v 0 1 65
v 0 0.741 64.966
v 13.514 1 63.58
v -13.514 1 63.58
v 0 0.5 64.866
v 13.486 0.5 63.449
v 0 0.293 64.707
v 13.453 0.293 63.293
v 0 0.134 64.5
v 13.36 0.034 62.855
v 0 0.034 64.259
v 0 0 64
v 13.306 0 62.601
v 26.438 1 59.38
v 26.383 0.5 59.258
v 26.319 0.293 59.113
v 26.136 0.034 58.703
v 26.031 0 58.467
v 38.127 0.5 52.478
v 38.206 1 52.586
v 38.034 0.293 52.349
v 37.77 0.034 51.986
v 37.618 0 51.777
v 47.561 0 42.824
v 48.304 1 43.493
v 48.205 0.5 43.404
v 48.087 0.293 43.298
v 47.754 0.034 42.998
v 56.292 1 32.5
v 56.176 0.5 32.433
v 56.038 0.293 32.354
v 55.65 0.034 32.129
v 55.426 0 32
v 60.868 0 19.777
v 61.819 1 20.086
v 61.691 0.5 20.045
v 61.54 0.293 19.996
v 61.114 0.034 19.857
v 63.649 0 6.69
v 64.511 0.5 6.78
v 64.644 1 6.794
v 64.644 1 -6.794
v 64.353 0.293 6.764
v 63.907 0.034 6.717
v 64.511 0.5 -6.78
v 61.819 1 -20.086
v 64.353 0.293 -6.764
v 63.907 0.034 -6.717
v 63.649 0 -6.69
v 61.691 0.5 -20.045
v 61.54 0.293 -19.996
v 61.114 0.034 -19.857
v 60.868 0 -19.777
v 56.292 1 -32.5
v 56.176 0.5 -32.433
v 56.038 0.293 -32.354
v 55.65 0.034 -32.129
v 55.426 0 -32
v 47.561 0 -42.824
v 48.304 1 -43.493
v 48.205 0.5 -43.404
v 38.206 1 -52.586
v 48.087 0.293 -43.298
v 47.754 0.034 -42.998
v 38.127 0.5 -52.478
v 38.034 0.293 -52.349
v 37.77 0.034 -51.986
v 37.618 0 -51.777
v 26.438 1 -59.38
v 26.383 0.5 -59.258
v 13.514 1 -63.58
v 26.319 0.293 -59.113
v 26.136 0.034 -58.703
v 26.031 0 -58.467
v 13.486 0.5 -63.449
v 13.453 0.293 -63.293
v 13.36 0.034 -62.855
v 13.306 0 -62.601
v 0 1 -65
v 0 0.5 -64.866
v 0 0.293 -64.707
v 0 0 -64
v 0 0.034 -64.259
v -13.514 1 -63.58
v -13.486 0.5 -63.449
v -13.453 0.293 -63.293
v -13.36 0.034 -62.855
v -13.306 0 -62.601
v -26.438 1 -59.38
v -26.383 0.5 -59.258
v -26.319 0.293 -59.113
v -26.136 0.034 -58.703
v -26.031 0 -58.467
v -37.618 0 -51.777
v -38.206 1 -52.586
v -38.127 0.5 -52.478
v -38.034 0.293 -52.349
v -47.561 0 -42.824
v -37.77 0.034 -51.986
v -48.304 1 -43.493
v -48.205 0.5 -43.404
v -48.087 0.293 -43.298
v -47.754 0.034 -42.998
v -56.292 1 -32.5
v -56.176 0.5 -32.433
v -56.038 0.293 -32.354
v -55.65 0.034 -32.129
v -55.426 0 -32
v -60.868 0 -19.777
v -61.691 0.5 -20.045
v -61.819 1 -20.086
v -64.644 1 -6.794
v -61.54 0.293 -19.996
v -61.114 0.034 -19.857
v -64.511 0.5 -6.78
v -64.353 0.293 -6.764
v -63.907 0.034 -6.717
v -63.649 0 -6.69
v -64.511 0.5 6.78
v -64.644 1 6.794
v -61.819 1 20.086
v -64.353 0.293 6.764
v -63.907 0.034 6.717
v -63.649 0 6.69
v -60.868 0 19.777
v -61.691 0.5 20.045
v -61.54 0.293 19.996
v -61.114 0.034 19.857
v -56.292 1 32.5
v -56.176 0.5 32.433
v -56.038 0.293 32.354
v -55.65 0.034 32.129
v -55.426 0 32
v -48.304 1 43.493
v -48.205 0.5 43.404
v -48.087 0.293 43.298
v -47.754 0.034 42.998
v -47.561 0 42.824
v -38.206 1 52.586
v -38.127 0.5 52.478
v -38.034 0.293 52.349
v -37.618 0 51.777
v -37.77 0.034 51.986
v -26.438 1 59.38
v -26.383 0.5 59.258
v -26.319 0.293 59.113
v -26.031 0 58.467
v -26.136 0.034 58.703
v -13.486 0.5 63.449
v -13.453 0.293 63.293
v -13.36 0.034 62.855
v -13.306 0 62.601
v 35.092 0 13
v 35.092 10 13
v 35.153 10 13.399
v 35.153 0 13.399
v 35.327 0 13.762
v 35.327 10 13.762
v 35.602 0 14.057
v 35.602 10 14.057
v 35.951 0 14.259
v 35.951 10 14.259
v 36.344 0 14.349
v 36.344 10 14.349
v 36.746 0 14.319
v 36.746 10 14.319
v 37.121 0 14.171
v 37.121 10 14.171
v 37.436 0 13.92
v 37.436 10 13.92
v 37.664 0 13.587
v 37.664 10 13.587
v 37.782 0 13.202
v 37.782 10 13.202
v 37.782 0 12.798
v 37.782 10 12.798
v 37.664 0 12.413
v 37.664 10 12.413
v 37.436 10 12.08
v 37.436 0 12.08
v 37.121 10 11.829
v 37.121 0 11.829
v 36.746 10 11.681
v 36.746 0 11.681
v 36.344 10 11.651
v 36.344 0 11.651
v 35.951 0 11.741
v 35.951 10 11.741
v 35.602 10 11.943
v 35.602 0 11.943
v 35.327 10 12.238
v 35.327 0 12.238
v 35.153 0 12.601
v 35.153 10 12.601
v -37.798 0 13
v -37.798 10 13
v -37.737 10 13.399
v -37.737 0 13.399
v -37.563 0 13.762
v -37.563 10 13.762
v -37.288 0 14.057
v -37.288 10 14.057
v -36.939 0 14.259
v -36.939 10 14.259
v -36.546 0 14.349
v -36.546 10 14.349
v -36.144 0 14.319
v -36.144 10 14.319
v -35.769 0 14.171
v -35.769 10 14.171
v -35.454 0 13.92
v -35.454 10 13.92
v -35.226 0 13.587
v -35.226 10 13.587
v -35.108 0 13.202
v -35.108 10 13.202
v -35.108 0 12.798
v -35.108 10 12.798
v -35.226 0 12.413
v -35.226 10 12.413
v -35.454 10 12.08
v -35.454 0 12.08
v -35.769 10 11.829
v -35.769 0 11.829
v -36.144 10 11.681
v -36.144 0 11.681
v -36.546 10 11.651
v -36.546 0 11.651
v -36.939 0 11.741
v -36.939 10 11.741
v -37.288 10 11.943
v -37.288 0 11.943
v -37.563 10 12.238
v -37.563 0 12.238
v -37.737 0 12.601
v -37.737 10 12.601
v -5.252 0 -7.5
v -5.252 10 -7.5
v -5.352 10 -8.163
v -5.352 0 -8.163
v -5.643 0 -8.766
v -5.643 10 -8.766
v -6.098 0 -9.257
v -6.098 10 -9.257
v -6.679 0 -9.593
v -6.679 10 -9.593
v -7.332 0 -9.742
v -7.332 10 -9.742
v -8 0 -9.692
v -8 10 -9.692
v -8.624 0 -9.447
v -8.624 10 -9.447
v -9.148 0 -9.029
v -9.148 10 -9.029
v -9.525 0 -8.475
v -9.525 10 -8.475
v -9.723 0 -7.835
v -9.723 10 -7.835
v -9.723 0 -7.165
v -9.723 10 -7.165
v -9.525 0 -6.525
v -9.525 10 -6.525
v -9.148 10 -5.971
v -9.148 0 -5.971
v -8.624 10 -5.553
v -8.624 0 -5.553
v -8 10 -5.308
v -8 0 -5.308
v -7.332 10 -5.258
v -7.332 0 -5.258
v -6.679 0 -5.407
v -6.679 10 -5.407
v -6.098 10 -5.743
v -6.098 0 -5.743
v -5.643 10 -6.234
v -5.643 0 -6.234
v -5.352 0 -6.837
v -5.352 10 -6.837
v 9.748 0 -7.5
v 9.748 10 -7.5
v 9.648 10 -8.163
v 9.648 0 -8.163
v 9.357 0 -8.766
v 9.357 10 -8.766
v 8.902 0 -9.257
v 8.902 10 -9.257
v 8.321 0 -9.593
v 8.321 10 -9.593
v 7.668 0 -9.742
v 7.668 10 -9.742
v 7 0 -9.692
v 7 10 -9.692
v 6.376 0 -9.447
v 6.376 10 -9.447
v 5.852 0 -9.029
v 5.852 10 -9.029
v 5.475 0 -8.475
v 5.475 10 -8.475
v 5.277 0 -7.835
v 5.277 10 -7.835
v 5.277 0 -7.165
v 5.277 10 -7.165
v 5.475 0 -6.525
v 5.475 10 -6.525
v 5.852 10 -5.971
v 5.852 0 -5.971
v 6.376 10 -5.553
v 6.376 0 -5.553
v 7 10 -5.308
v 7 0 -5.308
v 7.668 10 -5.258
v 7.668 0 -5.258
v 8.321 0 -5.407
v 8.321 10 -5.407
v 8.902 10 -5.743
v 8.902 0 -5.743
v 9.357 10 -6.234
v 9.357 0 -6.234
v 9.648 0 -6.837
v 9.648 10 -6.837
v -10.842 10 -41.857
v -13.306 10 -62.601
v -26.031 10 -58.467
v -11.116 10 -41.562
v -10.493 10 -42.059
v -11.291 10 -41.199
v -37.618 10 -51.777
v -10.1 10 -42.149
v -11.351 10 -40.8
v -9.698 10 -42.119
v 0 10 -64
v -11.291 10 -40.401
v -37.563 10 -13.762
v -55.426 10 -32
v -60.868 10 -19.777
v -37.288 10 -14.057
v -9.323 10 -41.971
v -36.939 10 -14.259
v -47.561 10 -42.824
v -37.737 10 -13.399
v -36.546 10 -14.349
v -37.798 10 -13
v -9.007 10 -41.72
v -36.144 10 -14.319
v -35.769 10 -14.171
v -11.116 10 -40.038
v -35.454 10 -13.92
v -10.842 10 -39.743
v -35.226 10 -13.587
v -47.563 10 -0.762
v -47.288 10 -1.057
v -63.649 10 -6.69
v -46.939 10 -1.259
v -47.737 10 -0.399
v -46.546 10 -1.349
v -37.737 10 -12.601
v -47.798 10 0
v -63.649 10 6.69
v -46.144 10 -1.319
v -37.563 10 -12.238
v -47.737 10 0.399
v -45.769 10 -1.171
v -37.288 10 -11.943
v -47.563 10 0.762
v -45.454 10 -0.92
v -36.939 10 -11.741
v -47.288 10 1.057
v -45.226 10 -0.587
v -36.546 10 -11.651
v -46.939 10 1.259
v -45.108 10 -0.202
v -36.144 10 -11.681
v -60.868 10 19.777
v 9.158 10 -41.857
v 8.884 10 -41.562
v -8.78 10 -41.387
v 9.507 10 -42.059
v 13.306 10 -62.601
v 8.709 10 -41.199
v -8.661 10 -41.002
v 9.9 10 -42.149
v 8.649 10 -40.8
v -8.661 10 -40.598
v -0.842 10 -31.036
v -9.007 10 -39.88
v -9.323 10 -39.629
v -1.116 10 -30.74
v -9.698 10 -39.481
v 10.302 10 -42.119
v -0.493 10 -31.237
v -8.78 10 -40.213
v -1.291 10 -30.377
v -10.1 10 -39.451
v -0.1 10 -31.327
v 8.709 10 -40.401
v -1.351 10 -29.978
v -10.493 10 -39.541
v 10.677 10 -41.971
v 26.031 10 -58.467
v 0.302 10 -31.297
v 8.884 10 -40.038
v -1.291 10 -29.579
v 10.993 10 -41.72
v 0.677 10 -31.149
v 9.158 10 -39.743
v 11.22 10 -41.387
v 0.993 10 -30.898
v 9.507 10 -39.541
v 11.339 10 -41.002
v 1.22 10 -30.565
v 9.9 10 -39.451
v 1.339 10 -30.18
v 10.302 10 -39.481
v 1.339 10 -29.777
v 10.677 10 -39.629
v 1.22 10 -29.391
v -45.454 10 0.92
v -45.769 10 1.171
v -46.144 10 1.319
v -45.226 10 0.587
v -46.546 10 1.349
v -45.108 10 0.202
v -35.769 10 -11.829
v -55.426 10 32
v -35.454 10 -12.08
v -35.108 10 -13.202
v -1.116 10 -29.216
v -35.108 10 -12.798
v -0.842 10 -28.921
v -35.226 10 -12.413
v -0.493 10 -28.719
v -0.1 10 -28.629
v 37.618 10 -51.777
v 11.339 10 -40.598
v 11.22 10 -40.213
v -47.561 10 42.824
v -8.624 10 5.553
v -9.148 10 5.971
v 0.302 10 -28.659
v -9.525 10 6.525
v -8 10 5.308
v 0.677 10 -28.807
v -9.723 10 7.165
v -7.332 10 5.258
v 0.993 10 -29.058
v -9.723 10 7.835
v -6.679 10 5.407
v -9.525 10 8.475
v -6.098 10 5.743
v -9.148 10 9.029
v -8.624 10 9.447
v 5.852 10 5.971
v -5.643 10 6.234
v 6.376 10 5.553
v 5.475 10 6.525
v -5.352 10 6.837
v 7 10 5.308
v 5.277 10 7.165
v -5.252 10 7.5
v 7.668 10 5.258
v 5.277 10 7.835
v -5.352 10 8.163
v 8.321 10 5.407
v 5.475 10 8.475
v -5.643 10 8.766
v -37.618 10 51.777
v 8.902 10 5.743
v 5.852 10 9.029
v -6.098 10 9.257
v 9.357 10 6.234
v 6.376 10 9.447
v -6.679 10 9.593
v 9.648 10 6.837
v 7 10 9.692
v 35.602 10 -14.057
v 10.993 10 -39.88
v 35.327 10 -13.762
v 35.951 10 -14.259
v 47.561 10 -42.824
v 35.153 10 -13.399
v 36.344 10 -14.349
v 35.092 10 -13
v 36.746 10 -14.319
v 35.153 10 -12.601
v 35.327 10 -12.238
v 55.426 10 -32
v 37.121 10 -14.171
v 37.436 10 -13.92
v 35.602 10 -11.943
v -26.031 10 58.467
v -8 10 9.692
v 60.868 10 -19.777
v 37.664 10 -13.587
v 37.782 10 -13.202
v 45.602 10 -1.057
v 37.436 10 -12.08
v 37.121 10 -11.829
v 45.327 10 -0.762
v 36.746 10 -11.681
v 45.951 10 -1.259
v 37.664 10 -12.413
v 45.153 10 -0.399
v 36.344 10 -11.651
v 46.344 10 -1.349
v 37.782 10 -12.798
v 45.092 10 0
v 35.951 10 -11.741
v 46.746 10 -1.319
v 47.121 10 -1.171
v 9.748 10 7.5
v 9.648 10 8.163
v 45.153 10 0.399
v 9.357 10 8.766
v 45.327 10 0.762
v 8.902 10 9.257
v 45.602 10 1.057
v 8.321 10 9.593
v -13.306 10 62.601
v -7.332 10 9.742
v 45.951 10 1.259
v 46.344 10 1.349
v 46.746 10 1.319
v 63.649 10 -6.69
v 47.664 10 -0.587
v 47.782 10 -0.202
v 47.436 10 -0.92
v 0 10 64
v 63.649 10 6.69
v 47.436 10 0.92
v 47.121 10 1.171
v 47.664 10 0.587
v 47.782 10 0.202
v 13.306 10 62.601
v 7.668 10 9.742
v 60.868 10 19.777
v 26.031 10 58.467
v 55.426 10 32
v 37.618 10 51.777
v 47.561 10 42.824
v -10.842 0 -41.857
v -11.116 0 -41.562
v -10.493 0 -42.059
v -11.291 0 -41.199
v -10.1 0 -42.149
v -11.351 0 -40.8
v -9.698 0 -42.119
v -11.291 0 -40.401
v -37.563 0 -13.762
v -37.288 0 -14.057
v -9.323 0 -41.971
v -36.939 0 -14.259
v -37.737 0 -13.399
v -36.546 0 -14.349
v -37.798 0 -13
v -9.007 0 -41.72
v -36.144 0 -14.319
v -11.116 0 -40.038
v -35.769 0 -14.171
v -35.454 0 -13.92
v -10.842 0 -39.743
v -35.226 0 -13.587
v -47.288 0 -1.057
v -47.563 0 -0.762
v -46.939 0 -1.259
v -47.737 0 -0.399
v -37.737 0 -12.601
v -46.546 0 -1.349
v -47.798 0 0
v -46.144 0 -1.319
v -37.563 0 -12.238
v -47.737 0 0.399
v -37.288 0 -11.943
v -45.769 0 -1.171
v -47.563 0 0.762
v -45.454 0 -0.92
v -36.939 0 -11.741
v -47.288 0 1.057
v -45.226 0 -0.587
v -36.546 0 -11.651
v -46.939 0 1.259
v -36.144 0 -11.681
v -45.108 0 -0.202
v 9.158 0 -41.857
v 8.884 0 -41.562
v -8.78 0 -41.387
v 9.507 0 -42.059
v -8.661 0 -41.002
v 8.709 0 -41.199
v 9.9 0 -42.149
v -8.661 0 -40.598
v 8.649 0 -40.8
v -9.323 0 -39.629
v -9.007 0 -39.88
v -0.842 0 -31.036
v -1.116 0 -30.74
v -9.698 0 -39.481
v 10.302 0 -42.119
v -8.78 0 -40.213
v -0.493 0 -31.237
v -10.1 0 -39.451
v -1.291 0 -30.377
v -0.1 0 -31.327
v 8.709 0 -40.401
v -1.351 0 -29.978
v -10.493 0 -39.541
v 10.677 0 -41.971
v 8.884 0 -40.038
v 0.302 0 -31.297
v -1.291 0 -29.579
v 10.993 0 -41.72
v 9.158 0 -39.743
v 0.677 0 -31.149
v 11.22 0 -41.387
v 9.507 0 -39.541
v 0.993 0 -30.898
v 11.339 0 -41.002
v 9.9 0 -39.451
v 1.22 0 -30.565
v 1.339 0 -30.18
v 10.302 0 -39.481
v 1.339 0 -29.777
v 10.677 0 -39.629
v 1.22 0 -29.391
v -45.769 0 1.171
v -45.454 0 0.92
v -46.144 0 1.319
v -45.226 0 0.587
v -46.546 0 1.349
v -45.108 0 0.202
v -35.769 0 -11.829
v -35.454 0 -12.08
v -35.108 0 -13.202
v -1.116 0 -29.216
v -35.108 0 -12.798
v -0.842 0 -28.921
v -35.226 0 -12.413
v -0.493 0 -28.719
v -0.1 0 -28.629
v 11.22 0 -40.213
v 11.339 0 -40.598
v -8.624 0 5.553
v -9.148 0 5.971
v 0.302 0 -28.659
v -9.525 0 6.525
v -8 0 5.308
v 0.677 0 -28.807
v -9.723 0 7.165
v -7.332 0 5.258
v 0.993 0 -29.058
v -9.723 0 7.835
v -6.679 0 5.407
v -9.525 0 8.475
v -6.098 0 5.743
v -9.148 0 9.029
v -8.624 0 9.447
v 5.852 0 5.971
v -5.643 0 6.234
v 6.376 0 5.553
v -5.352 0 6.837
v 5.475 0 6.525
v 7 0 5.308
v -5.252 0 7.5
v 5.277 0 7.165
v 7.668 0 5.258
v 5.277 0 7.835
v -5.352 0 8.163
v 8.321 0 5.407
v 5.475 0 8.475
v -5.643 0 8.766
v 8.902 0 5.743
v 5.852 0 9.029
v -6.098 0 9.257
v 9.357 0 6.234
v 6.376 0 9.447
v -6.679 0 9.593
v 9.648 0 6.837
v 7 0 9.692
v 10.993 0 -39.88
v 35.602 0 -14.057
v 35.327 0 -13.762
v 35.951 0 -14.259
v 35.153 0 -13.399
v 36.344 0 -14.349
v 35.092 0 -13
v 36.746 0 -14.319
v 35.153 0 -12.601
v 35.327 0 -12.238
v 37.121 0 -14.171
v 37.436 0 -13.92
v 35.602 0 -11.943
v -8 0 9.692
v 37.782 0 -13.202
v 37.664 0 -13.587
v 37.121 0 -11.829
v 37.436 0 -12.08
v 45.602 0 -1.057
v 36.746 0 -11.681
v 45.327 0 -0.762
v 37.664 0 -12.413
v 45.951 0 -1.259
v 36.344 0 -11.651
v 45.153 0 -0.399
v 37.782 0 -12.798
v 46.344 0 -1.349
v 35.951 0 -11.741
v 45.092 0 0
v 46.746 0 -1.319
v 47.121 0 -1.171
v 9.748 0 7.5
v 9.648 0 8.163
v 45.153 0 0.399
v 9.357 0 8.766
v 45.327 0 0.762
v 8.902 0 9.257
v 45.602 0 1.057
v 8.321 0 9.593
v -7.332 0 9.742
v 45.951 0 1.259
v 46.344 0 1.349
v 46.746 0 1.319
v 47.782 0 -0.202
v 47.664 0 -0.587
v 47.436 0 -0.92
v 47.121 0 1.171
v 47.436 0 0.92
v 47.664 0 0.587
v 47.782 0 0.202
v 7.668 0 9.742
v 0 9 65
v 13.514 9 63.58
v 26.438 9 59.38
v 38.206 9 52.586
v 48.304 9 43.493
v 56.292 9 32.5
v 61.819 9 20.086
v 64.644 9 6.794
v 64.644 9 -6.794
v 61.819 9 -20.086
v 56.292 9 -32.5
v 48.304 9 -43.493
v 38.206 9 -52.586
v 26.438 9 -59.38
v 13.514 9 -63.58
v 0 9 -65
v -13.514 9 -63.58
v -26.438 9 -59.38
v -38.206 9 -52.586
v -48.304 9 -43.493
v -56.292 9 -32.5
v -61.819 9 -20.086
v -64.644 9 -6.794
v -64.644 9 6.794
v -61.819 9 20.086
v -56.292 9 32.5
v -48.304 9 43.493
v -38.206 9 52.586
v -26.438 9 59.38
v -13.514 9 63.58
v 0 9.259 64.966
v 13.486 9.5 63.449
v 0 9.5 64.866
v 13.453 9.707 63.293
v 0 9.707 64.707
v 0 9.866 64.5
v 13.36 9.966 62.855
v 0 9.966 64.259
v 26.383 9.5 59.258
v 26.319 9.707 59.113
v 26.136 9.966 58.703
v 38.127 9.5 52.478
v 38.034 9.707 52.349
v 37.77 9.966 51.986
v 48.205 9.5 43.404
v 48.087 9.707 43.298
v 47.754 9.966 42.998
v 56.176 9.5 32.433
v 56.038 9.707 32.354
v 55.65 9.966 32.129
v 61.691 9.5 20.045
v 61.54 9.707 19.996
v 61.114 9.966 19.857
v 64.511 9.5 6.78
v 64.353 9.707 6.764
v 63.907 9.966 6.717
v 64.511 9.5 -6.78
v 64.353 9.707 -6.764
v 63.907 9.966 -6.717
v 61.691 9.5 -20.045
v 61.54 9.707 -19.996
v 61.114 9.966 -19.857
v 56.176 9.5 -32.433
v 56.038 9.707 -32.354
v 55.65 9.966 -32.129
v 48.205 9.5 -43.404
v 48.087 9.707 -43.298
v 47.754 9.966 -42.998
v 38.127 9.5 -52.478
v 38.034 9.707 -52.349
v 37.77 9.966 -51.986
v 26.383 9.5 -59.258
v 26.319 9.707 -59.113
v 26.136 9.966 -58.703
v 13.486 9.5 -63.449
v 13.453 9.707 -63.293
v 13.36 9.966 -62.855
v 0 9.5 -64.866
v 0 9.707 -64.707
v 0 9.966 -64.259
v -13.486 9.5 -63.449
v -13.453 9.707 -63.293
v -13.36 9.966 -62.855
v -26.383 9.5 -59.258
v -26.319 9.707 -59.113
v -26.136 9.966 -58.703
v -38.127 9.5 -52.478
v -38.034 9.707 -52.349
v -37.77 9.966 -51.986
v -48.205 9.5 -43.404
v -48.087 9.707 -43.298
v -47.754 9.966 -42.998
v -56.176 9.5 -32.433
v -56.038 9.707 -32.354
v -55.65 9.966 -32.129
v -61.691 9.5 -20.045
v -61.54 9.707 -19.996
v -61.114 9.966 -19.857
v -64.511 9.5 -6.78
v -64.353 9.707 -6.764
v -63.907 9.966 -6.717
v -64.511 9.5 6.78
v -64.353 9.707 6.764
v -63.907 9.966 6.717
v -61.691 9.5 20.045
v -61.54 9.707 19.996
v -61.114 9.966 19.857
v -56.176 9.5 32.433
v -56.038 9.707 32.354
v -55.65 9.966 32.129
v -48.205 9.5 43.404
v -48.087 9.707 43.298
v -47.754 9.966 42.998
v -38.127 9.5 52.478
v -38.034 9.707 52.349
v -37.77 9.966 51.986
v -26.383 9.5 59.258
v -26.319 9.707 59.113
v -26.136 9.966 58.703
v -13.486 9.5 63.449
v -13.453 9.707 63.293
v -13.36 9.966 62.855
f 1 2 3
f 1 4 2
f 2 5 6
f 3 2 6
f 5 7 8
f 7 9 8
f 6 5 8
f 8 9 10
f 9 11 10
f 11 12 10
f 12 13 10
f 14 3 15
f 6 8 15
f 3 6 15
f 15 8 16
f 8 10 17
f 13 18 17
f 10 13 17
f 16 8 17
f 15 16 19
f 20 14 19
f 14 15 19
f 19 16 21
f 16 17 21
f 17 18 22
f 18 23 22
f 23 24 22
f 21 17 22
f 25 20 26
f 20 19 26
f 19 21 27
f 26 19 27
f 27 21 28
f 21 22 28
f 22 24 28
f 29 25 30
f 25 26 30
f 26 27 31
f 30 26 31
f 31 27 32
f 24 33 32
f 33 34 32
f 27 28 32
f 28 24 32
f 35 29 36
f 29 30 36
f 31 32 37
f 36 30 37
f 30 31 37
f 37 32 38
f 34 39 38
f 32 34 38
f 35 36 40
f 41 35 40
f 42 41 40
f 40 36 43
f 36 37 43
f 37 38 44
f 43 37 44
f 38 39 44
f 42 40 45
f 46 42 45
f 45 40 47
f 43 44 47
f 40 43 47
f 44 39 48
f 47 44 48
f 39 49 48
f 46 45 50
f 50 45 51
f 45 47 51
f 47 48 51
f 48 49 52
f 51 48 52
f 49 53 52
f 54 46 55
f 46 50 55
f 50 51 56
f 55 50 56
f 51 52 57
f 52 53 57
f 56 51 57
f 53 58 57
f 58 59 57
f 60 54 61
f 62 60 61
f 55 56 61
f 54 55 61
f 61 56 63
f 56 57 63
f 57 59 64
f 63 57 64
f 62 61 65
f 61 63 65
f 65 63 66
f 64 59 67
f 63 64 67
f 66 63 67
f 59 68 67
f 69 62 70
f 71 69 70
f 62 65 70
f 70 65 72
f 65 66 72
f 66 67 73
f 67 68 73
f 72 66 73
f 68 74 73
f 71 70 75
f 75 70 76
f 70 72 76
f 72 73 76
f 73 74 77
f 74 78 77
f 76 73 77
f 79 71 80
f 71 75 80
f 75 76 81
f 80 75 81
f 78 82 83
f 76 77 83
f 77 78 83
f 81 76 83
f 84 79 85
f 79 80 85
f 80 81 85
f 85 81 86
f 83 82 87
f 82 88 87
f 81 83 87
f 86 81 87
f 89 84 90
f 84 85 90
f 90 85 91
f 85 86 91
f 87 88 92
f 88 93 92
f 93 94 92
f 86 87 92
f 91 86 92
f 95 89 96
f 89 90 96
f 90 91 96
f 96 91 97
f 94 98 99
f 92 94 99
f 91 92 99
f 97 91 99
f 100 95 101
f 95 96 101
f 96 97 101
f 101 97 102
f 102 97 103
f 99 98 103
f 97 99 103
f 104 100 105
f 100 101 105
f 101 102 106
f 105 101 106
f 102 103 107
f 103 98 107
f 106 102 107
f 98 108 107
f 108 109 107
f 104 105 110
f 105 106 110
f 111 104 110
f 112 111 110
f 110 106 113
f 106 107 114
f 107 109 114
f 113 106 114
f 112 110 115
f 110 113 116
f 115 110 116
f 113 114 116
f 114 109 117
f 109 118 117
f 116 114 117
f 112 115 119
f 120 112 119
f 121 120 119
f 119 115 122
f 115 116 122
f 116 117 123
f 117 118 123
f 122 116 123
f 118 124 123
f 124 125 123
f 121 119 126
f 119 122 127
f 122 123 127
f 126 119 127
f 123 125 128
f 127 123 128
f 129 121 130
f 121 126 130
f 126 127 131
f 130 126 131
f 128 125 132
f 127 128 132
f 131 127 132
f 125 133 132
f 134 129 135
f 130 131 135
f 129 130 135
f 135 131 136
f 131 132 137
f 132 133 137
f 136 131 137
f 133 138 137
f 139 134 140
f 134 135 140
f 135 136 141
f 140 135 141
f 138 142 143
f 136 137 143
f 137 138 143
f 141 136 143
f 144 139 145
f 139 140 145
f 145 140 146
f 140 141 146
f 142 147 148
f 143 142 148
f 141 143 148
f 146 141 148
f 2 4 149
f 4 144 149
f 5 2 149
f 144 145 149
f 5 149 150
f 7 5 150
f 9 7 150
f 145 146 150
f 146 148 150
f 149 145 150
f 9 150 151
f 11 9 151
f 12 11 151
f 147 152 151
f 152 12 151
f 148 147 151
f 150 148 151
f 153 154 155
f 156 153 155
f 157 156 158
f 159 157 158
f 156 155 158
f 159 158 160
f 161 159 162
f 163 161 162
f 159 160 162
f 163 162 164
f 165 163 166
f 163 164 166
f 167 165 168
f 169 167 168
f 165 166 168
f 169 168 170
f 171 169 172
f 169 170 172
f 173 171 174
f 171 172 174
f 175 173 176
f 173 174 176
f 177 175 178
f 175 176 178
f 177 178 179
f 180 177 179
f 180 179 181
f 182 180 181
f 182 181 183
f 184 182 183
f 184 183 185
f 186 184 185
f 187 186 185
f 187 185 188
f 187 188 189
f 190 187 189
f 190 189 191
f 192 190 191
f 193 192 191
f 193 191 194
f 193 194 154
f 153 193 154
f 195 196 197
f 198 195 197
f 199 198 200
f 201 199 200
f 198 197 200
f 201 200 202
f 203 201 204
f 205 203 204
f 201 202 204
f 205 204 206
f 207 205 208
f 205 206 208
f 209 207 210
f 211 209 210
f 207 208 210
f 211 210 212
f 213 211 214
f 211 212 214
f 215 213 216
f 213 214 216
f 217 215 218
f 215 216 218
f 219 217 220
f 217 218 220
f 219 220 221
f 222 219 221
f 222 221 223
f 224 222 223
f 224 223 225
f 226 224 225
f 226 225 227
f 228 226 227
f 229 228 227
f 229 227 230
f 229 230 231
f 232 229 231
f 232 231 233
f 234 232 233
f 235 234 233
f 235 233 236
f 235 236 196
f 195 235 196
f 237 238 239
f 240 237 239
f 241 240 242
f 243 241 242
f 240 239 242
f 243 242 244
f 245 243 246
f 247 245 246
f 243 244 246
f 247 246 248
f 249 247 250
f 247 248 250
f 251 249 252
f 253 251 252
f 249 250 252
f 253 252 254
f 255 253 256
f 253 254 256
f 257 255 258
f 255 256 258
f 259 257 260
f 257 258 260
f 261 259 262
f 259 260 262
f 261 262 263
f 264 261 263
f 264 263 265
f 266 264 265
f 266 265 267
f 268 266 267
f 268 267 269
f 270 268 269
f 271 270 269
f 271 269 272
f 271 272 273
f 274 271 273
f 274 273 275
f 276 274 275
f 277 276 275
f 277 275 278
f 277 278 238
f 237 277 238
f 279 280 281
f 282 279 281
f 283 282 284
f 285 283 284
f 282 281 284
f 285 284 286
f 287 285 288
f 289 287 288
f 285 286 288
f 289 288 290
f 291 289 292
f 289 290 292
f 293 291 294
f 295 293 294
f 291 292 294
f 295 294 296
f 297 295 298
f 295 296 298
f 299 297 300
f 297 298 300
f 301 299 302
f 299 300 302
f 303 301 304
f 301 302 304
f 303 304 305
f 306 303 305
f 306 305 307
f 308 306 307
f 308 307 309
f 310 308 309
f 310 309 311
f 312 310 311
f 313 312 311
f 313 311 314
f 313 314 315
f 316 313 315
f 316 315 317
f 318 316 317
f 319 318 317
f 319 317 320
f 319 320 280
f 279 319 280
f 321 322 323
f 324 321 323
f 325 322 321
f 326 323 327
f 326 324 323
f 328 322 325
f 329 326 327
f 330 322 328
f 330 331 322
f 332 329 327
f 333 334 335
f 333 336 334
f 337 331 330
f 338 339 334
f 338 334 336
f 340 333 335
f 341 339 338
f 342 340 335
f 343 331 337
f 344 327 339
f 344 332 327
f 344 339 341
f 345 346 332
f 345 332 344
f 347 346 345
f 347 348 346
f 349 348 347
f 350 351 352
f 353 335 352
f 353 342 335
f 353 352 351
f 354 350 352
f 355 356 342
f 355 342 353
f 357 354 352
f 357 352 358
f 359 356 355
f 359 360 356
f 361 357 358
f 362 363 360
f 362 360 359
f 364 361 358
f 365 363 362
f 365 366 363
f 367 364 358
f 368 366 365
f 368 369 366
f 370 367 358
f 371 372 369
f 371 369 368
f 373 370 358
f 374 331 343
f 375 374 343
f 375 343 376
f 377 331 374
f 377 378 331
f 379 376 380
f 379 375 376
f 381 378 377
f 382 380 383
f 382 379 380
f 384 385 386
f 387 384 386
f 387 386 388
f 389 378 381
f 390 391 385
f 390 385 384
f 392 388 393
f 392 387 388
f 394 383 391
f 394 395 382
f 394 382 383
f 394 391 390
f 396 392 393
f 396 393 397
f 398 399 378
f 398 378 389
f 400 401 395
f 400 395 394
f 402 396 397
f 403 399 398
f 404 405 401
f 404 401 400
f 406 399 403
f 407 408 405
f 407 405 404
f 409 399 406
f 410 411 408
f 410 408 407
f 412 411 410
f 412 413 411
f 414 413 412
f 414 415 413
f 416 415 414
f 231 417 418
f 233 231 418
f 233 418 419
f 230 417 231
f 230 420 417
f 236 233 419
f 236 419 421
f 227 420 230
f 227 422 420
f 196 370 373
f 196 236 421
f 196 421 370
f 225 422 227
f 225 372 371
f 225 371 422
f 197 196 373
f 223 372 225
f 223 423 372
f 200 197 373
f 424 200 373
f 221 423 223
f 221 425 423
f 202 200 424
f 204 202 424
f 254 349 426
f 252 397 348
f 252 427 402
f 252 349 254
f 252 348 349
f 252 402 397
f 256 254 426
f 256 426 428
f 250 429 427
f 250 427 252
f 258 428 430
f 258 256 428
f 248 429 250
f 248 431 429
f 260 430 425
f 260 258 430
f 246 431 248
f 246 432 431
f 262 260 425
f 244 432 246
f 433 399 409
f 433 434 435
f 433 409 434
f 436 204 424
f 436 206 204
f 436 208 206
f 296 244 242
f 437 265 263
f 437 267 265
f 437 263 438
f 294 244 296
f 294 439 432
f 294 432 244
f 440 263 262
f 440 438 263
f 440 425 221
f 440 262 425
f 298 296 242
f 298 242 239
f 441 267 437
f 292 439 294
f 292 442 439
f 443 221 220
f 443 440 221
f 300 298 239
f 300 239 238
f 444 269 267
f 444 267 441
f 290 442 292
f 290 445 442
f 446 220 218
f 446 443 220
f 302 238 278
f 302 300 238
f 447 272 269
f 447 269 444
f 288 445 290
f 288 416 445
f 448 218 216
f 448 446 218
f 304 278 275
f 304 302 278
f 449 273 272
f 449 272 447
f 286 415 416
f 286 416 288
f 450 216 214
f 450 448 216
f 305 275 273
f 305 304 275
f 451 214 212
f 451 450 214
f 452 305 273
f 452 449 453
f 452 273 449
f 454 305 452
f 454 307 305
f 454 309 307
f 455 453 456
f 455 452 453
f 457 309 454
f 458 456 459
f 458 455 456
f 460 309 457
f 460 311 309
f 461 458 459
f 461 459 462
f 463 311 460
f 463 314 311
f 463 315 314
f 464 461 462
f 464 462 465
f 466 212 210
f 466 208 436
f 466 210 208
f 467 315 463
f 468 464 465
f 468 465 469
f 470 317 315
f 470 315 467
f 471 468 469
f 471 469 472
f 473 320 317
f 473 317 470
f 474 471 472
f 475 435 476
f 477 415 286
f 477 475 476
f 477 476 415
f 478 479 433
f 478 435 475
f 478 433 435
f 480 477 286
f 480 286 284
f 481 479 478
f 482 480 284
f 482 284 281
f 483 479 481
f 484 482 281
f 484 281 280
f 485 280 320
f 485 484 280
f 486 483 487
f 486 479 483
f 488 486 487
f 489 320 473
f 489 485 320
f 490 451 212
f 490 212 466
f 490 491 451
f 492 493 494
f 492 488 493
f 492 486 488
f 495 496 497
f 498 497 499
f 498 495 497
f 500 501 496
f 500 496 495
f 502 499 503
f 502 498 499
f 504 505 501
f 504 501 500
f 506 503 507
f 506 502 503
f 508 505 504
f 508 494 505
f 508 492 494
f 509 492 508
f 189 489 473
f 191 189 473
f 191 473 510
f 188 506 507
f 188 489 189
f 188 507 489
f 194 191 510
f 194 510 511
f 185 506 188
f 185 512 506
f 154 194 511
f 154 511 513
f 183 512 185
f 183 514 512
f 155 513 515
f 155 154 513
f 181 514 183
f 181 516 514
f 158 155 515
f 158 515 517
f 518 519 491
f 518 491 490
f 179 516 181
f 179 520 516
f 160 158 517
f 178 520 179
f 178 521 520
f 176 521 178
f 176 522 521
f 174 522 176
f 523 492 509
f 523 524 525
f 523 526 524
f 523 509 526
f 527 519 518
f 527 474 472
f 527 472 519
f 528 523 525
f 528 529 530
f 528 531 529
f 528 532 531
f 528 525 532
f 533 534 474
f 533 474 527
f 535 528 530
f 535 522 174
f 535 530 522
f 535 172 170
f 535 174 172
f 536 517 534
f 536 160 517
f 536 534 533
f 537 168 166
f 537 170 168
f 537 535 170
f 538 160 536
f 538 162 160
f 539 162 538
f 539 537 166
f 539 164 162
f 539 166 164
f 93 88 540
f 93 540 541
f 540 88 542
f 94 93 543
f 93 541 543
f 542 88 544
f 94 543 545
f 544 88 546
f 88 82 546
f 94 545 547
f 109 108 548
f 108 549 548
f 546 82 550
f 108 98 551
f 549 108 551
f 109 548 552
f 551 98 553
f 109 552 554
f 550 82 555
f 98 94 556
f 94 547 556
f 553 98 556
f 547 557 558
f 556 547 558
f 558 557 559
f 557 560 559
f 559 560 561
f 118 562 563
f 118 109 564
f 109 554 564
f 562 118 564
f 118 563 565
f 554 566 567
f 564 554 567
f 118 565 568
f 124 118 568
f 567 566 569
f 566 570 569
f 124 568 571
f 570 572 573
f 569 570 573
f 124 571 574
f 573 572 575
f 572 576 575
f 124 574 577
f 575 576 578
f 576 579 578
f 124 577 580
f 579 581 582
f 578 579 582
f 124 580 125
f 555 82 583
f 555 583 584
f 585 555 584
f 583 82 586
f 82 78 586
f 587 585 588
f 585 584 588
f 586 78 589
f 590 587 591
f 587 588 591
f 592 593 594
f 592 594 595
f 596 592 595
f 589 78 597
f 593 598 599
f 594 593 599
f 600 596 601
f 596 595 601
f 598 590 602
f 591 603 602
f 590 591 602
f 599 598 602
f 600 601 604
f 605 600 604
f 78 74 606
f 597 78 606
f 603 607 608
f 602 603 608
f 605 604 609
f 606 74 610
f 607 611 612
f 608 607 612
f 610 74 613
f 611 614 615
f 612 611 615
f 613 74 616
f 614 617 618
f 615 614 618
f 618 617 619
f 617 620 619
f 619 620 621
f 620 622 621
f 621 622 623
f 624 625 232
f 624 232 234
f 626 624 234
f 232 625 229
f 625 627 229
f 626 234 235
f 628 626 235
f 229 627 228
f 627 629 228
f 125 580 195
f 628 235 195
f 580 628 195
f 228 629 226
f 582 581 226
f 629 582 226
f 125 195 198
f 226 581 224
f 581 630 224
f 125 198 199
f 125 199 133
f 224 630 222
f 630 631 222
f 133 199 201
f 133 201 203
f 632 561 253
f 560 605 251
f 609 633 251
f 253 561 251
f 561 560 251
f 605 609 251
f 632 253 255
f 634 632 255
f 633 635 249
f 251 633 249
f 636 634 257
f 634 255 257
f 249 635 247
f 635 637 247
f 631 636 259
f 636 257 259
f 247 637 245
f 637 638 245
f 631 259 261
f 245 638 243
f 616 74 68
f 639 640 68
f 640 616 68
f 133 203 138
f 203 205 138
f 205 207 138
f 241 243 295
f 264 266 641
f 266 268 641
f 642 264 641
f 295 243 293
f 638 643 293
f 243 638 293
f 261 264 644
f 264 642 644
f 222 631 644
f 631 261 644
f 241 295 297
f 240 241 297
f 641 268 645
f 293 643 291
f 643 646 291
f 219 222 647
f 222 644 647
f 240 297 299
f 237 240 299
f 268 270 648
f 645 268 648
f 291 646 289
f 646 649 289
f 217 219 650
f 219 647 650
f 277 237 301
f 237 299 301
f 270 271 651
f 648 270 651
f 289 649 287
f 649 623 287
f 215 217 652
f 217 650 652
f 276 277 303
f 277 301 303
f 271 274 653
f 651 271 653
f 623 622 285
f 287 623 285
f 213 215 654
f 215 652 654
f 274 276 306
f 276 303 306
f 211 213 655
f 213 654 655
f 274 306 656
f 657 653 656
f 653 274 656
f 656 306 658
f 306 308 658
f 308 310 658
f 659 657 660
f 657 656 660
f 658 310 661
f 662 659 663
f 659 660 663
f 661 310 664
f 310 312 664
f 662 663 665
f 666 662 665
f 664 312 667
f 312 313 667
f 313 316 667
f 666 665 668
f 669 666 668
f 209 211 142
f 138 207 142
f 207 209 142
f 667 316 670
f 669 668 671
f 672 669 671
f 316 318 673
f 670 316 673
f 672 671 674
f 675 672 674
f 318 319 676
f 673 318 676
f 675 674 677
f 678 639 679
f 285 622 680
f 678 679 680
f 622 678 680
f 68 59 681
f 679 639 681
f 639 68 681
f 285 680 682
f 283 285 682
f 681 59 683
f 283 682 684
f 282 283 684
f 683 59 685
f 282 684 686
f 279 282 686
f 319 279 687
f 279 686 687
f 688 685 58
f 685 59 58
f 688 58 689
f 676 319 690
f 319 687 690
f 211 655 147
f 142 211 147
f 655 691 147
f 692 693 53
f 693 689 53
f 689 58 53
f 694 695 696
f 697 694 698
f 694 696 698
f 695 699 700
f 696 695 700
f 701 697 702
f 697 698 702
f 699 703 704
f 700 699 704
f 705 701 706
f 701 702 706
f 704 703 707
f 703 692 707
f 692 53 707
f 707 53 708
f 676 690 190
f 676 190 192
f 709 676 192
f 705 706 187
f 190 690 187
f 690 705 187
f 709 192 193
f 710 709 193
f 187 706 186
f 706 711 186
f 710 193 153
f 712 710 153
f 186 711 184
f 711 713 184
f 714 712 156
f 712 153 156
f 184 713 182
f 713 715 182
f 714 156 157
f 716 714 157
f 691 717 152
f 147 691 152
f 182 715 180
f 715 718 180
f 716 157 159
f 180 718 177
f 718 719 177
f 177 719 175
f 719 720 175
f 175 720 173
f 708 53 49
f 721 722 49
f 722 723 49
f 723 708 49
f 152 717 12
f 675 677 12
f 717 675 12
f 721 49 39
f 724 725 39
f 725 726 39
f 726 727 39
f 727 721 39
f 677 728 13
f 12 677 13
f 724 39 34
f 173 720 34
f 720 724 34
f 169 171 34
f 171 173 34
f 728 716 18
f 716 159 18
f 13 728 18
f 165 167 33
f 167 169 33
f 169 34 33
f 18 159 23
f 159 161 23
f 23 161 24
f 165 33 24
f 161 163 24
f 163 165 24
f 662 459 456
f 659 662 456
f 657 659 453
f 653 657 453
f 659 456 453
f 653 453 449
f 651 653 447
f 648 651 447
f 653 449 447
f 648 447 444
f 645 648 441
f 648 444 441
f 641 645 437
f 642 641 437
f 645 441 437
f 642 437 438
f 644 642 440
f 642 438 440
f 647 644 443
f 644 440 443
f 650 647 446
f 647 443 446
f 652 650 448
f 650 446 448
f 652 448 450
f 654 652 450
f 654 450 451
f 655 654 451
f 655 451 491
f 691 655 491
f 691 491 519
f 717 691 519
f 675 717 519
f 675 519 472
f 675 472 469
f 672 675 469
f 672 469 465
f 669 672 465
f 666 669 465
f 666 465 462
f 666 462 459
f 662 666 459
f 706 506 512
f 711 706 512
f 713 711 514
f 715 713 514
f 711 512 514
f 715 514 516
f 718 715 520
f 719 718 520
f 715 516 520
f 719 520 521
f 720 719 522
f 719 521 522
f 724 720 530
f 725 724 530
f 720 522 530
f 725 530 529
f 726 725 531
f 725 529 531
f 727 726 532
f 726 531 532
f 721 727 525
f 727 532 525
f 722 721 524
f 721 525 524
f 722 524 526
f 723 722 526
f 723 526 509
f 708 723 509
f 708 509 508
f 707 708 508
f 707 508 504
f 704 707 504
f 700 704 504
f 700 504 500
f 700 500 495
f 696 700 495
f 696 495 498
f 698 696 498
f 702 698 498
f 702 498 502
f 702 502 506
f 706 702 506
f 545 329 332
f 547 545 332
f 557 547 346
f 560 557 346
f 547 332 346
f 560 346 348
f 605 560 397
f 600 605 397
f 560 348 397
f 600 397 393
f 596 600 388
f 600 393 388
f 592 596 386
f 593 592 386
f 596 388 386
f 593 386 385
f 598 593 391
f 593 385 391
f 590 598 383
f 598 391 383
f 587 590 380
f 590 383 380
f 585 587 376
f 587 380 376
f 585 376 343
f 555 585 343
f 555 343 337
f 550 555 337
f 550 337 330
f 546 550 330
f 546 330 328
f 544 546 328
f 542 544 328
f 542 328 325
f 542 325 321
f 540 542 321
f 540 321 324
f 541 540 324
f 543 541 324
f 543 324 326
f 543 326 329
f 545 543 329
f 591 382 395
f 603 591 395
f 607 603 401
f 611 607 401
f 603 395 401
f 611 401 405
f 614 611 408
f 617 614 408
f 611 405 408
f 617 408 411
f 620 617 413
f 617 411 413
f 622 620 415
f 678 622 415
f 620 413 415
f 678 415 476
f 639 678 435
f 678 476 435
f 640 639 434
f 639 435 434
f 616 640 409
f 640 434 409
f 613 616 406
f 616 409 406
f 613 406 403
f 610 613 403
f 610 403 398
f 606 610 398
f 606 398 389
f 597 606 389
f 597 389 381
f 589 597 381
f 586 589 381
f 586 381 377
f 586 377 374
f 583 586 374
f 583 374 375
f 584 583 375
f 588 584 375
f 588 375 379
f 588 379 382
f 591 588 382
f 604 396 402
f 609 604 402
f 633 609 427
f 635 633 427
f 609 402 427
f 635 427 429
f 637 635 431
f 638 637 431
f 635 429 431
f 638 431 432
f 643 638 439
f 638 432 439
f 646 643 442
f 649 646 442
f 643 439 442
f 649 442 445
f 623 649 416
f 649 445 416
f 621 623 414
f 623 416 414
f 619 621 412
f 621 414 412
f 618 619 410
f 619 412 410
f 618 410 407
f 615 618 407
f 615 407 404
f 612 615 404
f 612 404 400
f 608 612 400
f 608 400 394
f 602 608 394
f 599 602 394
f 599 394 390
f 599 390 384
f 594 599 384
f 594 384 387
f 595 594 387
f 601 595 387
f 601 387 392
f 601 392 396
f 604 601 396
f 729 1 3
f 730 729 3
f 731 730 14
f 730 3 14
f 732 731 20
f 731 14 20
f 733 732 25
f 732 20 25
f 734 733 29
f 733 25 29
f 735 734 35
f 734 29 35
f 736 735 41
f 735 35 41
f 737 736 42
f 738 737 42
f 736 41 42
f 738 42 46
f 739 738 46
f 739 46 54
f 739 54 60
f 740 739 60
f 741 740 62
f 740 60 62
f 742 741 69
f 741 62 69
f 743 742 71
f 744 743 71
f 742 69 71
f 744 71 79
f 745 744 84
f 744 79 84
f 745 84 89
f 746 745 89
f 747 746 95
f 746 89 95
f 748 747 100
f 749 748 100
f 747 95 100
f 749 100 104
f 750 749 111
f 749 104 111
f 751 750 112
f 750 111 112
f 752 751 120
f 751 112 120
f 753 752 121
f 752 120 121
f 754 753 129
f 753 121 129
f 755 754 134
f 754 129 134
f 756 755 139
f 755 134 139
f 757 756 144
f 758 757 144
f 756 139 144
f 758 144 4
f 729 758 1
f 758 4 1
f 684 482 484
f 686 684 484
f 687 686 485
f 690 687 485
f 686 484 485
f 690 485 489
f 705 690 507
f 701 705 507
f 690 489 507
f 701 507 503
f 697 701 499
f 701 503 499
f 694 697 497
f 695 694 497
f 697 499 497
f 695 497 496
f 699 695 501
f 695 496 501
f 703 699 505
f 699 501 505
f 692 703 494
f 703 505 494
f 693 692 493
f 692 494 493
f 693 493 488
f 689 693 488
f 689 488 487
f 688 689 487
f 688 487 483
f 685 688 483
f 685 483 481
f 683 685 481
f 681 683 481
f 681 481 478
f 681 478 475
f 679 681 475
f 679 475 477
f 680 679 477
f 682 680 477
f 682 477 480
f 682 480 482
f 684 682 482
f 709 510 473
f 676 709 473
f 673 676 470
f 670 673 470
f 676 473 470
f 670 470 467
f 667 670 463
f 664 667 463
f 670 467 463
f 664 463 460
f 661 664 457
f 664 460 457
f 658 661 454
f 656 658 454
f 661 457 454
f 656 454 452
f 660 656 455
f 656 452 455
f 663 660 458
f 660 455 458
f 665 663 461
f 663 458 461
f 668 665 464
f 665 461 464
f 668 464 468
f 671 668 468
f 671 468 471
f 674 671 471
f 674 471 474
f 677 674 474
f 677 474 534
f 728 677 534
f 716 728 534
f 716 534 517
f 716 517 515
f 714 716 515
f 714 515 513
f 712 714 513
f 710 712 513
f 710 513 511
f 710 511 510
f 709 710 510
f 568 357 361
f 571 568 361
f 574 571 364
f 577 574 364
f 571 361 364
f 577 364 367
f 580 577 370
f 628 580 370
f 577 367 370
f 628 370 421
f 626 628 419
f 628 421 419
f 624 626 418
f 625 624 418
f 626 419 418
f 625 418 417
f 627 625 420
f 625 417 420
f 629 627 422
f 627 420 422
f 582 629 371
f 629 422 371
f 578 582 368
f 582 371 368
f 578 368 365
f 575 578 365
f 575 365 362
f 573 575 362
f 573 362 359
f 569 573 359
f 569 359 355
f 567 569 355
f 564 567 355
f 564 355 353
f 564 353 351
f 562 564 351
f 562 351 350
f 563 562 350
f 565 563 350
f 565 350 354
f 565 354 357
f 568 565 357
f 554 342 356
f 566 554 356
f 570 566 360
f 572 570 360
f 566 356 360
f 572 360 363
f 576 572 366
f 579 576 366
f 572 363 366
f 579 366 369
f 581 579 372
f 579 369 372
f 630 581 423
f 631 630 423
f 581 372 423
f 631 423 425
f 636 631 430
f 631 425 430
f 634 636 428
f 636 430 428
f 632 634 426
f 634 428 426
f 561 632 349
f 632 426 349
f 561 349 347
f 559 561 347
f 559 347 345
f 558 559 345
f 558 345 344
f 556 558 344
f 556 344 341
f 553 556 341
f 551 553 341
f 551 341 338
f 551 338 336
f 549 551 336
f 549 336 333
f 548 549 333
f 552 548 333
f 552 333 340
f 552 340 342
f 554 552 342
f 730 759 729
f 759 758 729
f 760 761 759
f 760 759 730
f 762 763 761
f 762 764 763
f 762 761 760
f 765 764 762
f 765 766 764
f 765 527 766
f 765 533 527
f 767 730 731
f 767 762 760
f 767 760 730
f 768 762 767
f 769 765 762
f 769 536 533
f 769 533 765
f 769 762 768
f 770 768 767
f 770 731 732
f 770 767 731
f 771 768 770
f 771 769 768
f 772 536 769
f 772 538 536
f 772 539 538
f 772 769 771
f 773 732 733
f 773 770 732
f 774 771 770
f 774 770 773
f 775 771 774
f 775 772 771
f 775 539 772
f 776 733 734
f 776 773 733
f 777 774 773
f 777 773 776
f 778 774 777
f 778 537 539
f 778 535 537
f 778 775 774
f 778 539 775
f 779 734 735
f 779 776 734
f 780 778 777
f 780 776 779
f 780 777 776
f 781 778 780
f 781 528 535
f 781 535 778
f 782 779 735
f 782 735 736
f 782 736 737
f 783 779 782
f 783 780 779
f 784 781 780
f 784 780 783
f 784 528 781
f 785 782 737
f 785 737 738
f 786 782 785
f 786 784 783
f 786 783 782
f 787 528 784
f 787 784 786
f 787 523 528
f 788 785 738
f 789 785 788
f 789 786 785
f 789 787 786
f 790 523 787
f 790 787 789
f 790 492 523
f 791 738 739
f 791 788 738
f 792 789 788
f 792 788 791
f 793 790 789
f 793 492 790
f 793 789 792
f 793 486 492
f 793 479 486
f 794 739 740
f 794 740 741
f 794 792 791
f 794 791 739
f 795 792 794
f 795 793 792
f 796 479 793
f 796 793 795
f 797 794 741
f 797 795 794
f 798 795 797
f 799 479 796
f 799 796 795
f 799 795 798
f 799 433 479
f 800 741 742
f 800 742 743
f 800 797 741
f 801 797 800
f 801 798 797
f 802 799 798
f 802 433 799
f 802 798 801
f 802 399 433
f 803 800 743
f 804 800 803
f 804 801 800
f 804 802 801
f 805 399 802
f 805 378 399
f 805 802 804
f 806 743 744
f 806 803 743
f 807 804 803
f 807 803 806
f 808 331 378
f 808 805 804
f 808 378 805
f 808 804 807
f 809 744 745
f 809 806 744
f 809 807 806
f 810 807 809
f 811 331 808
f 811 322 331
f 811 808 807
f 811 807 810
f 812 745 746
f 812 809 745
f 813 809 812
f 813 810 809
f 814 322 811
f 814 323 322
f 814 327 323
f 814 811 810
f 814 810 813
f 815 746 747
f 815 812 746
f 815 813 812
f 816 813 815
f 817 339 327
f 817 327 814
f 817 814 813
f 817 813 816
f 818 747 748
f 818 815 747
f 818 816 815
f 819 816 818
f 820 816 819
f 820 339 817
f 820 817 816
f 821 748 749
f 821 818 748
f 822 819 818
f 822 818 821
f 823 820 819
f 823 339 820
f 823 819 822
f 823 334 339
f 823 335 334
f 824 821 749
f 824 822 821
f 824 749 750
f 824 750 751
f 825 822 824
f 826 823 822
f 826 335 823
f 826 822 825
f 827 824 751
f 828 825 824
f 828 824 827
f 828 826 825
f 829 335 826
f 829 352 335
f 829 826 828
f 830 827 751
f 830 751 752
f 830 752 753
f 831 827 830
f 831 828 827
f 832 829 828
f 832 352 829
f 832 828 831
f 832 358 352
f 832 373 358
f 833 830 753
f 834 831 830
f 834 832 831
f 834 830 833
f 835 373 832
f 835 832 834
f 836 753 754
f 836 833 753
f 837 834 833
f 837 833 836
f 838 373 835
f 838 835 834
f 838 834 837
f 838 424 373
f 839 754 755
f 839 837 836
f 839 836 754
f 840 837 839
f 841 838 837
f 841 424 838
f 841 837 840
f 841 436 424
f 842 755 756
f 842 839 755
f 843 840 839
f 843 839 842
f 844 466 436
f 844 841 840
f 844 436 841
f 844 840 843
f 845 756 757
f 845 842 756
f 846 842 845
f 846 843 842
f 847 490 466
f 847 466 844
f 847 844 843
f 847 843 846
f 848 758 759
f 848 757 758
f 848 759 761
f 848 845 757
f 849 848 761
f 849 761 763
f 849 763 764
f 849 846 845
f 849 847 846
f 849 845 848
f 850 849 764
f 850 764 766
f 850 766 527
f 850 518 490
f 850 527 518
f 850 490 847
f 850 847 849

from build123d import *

# Parameters (mm, degrees)
SKETCH1_R             = 65
BOSS_EXTRUDE1_DEPTH   = 10
FILLET1_R             = 1
F_6_32_TAPPED_HOLE1_D = 2.7051
F_8_CLEARANCE_HOLE1_D = 4.4958


with BuildPart() as part:
    # Sketch1 → Boss-Extrude1 (new body)
    with BuildSketch(Plane(origin=(0, 0, 0), x_dir=(1, 0, 0), z_dir=(0, 1, 0))):
        with Locations(Location((0, 0, 0), (0, 0, 270))):
            Circle(SKETCH1_R)
    extrude(amount=BOSS_EXTRUDE1_DEPTH)

    # Fillet1
    fillet1_edges = [part.edges().sort_by_distance(p)[0] for p in [
        (0, 0, -65),
        (0, 10, -65),
    ]]
    fillet(fillet1_edges, radius=FILLET1_R)

    # #6-32 Tapped Hole1 (through all)
    with Locations(Plane.XZ):
        with Locations((-46.445, 0), (46.445, 0), (-36.445, -13), (-36.445, 13), (36.445, 13), (36.445, -13), (10.00119449, -40.8), (0.00119449, -29.978097245), (-9.99880551, -40.8)):
            Hole(F_6_32_TAPPED_HOLE1_D / 2)

    # #8 Clearance Hole1 (through all)
    with Locations(Plane(origin=(0, 0, 0), x_dir=(-1, 0, 0), z_dir=(0, -1, 0))):
        with Locations((7.5, -7.5), (-7.5, -7.5), (7.5, 7.5), (-7.5, 7.5)):
            Hole(F_8_CLEARANCE_HOLE1_D / 2)


solid = part.part
